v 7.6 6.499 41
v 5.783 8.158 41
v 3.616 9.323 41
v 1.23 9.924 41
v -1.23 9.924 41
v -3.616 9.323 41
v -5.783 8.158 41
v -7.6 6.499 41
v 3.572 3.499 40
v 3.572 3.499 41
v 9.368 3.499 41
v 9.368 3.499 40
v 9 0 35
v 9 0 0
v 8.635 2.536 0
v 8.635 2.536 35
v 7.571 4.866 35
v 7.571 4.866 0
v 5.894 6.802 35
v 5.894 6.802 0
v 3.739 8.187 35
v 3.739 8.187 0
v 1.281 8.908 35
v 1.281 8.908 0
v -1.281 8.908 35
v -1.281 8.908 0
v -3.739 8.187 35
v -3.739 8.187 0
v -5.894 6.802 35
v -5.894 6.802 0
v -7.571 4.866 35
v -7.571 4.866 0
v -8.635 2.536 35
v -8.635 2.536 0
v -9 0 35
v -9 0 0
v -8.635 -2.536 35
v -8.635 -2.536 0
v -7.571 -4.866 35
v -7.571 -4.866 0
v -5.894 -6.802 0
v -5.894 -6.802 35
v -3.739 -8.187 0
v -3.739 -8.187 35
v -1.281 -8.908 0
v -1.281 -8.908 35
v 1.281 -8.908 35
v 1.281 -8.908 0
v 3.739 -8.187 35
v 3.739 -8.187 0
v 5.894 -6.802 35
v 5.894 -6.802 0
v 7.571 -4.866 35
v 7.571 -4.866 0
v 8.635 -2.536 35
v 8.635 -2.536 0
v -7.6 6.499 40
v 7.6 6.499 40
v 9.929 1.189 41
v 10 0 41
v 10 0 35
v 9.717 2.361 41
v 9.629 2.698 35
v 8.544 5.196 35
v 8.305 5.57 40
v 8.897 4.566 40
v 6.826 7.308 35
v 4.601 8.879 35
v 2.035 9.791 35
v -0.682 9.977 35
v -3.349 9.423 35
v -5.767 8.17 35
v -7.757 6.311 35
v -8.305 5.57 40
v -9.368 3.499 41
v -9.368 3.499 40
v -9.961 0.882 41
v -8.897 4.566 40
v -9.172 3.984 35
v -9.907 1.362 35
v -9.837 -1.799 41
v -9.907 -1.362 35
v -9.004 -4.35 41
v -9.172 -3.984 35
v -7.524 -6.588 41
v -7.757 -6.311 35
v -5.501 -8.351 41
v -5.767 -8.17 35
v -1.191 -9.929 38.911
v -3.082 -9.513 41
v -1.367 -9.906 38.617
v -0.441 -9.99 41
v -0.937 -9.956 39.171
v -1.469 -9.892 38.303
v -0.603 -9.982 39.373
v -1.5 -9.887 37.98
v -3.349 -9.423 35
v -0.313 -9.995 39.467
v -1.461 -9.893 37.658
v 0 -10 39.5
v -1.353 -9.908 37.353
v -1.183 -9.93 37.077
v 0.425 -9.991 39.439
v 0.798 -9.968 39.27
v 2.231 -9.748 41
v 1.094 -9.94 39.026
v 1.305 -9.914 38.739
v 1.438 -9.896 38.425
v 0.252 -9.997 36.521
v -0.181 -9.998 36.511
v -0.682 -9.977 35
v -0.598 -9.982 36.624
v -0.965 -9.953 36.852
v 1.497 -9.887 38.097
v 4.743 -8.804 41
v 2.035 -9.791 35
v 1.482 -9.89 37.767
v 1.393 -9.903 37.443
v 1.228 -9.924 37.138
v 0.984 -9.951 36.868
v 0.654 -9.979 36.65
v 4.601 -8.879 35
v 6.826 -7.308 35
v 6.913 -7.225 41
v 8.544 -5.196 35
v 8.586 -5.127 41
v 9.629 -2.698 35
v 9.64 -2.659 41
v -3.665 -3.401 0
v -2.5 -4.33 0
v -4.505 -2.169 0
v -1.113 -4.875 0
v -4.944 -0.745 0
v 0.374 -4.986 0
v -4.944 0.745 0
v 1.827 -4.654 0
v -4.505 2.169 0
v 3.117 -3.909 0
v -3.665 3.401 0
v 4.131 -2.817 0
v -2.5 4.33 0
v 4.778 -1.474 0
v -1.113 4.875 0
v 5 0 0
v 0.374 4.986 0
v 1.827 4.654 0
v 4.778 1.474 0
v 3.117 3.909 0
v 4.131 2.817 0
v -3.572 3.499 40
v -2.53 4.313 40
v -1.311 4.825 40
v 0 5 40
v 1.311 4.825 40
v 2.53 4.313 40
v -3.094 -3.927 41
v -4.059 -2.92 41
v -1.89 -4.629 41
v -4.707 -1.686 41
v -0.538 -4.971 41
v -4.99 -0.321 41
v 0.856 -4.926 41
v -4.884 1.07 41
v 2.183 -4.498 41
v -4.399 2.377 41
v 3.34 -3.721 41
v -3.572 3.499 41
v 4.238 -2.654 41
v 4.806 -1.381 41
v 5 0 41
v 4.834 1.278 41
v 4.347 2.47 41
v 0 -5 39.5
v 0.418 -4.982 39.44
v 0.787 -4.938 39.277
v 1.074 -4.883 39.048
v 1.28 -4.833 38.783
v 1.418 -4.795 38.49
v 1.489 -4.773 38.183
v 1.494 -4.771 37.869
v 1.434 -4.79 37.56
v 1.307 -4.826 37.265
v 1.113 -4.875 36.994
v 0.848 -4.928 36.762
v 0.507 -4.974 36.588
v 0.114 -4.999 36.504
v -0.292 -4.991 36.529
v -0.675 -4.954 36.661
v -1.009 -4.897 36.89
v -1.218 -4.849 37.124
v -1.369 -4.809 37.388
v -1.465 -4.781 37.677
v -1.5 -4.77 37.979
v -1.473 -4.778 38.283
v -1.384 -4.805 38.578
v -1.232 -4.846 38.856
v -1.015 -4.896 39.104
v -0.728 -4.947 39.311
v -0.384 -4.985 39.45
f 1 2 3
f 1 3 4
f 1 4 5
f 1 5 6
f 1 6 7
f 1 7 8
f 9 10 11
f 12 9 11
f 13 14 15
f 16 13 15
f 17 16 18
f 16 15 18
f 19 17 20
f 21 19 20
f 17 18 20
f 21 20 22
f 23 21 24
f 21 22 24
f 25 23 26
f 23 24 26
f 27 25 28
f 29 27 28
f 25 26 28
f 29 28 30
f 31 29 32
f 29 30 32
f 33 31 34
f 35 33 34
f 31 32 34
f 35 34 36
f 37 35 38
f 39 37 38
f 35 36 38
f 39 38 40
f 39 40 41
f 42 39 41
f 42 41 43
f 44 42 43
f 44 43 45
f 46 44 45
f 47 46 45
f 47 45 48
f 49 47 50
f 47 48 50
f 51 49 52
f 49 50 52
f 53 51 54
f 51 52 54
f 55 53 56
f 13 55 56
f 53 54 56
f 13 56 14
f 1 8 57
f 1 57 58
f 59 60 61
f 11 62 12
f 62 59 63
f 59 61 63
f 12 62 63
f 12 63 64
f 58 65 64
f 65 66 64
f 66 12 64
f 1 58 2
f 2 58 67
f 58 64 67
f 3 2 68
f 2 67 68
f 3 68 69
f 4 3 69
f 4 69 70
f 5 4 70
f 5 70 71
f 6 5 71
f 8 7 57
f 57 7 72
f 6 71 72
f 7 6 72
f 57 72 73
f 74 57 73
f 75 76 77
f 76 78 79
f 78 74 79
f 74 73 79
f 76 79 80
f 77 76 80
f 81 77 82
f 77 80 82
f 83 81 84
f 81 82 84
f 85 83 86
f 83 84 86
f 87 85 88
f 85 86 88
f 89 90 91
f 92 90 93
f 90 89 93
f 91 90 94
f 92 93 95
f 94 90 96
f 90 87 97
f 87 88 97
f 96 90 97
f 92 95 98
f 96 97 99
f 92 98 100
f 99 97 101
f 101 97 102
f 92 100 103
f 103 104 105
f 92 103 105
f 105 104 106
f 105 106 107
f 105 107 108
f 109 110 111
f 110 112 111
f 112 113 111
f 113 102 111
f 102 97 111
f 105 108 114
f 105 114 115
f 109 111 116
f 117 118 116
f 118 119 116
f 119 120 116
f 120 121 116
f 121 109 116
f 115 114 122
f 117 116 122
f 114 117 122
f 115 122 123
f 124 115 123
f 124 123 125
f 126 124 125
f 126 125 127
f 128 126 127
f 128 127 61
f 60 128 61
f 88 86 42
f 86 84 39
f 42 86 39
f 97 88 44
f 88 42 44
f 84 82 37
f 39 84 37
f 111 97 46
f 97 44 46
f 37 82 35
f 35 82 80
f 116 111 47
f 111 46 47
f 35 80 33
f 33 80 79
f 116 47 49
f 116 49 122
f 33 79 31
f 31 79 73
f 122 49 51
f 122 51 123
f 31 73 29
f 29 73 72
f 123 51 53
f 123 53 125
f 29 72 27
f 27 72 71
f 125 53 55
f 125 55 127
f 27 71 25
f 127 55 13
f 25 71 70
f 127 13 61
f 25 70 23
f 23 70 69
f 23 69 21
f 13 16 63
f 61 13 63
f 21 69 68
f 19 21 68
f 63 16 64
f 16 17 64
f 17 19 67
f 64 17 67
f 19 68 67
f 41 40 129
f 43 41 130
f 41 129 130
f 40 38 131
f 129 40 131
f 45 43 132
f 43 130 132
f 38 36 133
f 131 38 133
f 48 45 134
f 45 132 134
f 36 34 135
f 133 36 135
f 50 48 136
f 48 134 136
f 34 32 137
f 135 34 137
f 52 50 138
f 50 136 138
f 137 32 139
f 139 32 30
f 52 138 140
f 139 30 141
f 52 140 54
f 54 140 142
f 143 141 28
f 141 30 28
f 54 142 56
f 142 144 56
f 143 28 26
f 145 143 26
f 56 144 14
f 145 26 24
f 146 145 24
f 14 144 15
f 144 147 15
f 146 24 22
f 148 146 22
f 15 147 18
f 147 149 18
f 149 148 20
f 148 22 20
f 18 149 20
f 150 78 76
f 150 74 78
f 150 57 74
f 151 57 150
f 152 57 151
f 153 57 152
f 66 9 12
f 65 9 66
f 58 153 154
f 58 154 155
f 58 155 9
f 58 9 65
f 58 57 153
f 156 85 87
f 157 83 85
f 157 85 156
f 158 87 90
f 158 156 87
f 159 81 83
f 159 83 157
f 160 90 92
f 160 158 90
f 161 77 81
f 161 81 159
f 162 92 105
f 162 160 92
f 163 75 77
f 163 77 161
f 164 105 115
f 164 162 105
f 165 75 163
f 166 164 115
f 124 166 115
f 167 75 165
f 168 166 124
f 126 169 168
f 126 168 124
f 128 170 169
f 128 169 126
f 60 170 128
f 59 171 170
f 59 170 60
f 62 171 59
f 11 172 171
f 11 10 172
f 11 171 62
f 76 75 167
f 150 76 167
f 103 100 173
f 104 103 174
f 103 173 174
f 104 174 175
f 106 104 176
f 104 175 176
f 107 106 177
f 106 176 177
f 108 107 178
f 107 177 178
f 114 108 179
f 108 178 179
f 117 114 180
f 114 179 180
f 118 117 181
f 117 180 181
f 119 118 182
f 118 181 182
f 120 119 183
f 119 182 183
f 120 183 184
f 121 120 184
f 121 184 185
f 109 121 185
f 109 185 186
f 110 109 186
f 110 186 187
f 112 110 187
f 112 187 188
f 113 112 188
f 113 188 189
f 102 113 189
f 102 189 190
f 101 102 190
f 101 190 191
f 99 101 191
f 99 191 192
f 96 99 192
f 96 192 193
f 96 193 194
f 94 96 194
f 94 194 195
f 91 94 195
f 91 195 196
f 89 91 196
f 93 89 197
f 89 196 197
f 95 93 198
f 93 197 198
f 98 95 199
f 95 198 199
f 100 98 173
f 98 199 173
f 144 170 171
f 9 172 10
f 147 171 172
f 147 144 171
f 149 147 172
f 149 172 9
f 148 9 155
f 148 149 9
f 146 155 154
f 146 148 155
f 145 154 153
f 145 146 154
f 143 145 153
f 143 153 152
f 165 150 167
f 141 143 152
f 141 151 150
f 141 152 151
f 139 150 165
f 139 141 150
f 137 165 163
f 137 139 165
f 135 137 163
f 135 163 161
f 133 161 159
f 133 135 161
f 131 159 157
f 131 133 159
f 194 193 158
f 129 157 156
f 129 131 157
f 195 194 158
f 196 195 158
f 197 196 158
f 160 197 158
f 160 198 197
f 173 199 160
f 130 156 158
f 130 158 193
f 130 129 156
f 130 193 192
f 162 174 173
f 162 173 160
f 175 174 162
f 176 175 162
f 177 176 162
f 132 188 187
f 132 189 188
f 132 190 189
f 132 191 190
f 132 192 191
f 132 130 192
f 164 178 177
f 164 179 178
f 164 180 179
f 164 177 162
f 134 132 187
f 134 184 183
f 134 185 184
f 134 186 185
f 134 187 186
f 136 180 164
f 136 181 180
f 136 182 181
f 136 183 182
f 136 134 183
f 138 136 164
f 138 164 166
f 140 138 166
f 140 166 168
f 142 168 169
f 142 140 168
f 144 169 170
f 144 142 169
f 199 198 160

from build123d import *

# Parameters (mm, degrees)
SKETCH_1_R               = 9
SKETCH_1_R_2             = 5
EXTRUDE_1_DEPTH          = 35
SKETCH_2_R               = 10
SKETCH_2_R_2             = 5
EXTRUDE_2_DEPTH          = 6
SKETCH_3_W               = 23.145336851
SKETCH_3_H               = 3
CUT_EXTRUDE_1_DEPTH      = 1
CUT_EXTRUDE_2_REACH      = 45.37
CUT_EXTRUDE_2_END_RADIUS = 10
SKETCH_4_R               = 1.5


with BuildPart() as part:
    # Эскиз1 → Бобышка-Вытянуть1 (new body)
    with BuildSketch(Plane.XY):
        Circle(SKETCH_1_R)
        Circle(SKETCH_1_R_2, mode=Mode.SUBTRACT)
    extrude(amount=EXTRUDE_1_DEPTH)

    # Эскиз2 → Бобышка-Вытянуть2 (add)
    with BuildSketch(Plane.XY.offset(35)):
        Circle(SKETCH_2_R)
        Circle(SKETCH_2_R_2, mode=Mode.SUBTRACT)
    extrude(amount=EXTRUDE_2_DEPTH)

    # Эскиз3 → Вырез-Вытянуть1 (cut)
    with BuildSketch(Plane.XY.offset(41)):
        with Locations((0.097661358, 4.999046135)):
            Rectangle(SKETCH_3_W, SKETCH_3_H)
    extrude(amount=-CUT_EXTRUDE_1_DEPTH, mode=Mode.SUBTRACT)

    # Вырез-Вытянуть2: up to this cylinder (the profile starts inside it)
    cut_extrude_2_end = Plane(origin=(0, 0, 38), z_dir=(0, 0, -1)) * Cylinder(CUT_EXTRUDE_2_END_RADIUS, 111.74, mode=Mode.PRIVATE)
    # Эскиз4 → Вырез-Вытянуть2 (cut, up to the surface)
    with BuildSketch(Plane(origin=(0, 0, 0), x_dir=(1, 0, 0), z_dir=(0, 1, 0)), mode=Mode.PRIVATE) as cut_extrude_2_sk1:
        with Locations(Location((0, -38, 0), (0, 0, 270))):
            Circle(SKETCH_4_R)
    cut_extrude_2_tool1 = extrude(cut_extrude_2_sk1.sketch, amount=-CUT_EXTRUDE_2_REACH, mode=Mode.PRIVATE) & cut_extrude_2_end
    add(cut_extrude_2_tool1.solids().sort_by_distance((0, 0, 38))[0], mode=Mode.SUBTRACT)


solid = part.part
